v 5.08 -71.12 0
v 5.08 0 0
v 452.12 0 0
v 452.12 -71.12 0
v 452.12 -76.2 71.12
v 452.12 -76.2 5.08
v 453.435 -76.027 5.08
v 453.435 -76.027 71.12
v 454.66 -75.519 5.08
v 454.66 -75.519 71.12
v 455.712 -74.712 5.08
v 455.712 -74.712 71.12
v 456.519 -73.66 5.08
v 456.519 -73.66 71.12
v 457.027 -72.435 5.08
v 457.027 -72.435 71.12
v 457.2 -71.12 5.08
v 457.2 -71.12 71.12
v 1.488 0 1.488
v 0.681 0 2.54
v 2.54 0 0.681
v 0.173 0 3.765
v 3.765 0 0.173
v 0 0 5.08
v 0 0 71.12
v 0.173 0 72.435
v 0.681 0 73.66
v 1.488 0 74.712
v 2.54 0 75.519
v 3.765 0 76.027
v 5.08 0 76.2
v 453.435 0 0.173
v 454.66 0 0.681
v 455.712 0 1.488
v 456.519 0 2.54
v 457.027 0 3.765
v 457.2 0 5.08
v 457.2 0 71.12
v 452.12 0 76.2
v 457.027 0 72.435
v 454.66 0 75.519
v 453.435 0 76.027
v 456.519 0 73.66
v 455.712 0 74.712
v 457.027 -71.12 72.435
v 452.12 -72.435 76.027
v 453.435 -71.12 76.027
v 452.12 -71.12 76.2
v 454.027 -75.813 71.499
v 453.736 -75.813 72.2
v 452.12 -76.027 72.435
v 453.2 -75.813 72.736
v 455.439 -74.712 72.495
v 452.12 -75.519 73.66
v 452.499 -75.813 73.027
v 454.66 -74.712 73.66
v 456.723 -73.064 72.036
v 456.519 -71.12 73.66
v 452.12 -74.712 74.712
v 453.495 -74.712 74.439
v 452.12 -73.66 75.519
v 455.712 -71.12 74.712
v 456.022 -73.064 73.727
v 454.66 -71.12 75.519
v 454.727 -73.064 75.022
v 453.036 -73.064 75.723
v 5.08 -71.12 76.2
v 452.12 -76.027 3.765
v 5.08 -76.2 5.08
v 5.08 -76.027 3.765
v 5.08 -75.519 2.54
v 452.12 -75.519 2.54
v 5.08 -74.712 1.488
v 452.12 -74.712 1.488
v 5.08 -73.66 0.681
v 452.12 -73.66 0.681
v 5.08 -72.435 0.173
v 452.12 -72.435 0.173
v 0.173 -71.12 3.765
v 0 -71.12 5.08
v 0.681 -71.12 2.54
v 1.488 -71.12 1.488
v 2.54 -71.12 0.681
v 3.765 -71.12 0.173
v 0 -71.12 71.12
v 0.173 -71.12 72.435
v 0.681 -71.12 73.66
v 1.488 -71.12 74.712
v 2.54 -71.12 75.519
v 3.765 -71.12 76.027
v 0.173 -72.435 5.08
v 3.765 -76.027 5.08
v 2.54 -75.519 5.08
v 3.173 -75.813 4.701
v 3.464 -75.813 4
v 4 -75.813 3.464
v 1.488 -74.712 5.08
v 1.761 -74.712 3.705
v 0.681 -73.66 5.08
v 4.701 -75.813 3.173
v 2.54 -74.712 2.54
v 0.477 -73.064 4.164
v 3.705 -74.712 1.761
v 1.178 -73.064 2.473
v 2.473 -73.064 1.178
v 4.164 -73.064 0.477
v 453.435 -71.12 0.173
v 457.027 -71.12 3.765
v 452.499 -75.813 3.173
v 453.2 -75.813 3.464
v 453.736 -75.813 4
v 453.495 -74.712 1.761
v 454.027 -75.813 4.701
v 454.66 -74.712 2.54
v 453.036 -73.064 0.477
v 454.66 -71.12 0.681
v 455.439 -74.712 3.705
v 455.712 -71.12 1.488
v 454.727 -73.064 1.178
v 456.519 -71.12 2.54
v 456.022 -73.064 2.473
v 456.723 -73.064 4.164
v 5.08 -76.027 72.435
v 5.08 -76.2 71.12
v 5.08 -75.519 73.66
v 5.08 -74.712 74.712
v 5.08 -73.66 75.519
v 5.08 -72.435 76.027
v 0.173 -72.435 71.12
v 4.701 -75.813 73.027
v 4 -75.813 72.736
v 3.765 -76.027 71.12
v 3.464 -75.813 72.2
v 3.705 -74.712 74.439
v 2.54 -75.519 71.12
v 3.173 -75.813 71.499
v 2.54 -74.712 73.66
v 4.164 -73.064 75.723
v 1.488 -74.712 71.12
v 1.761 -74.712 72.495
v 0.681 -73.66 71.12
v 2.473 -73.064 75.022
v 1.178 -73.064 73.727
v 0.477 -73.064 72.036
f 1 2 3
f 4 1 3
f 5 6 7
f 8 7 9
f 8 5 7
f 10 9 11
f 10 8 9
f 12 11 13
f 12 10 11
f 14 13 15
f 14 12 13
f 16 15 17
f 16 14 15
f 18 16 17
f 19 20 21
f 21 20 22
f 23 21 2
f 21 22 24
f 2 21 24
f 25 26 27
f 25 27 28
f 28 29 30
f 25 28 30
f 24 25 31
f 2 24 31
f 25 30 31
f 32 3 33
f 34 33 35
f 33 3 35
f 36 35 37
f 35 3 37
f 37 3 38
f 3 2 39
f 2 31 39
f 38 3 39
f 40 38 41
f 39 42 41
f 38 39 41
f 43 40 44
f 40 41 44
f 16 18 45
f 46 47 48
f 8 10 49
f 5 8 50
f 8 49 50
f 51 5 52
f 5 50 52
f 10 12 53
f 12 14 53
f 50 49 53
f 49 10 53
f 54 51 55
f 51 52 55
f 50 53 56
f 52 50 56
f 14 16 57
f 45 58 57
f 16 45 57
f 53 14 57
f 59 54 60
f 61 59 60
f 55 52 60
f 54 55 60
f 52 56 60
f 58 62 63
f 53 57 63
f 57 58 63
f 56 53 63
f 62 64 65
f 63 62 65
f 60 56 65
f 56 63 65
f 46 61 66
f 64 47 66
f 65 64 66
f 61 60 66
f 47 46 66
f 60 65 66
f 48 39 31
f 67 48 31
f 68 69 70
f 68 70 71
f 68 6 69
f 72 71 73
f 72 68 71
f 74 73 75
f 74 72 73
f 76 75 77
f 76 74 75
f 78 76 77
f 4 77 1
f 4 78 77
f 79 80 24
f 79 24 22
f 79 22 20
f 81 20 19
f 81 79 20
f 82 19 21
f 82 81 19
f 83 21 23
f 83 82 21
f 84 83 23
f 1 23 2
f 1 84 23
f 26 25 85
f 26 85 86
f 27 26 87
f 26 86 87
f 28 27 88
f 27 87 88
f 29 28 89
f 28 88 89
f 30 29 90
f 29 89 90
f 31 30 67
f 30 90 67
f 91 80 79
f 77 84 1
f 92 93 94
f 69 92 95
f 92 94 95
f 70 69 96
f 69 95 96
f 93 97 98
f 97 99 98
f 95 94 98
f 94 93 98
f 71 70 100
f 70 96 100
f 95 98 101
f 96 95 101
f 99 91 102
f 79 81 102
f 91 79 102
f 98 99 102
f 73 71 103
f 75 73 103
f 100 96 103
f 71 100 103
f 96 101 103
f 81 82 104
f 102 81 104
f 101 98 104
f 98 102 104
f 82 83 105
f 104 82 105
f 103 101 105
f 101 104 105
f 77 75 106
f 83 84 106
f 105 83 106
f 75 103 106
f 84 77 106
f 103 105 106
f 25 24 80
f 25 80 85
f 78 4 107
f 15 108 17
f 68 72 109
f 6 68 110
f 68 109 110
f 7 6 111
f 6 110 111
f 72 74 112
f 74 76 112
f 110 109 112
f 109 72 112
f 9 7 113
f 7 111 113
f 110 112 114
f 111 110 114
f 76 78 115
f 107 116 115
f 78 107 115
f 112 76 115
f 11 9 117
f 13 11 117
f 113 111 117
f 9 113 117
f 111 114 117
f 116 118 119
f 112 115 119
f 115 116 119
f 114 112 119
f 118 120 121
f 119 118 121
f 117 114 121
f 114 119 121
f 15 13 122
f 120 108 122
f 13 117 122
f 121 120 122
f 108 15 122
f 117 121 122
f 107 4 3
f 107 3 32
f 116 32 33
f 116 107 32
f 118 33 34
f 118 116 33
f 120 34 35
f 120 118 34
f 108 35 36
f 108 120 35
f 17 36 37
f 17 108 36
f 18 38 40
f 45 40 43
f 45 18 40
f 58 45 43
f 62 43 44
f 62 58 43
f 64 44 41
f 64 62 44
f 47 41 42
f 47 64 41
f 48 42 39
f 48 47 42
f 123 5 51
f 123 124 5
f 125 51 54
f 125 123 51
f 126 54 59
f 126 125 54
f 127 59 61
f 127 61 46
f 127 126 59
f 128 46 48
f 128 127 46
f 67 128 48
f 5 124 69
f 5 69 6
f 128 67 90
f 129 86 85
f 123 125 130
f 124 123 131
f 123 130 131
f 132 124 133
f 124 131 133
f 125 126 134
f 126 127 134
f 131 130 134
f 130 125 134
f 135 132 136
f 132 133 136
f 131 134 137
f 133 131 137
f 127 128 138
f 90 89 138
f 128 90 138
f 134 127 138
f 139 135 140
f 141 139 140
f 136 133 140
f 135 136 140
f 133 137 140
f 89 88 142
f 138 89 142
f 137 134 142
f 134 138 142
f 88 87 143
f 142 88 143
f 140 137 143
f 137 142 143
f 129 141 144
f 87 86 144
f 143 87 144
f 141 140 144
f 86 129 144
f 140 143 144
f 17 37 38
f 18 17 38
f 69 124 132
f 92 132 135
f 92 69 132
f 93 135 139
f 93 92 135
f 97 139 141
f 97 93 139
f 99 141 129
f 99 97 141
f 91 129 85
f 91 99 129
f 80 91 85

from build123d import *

# Parameters (mm, degrees)
F0_W     = 50.8
F0_H     = 76.2
F0_W_2   = 355.6
F1_DEPTH = 76.2
F2_R     = 5.08
F3_R     = 5.08


with BuildPart() as f1:
    # F0 (on Front) → F1 (new body)
    with BuildSketch(Plane.XZ):
        with Locations((25.4, 38.1)):
            Rectangle(F0_W, F0_H)
        with Locations((228.6, 38.1)):
            Rectangle(F0_W_2, F0_H)
        with Locations((431.8, 38.1)):
            Rectangle(F0_W, F0_H)
    extrude(amount=F1_DEPTH)

    # F2
    f2_edges = [f1.edges().sort_by_distance(p)[0] for p in [
        (457.2, -38.1, 0),
        (0, -38.1, 0),
        (457.2, -38.1, 76.2),
        (0, -38.1, 76.2),
    ]]
    fillet(f2_edges, radius=F2_R)

    # F3
    f3_edges = [f1.edges().sort_by_distance(p)[0] for p in [
        (228.6, -76.2, 76.2),
    ]]
    fillet(f3_edges, radius=F3_R)


solid = f1.part
